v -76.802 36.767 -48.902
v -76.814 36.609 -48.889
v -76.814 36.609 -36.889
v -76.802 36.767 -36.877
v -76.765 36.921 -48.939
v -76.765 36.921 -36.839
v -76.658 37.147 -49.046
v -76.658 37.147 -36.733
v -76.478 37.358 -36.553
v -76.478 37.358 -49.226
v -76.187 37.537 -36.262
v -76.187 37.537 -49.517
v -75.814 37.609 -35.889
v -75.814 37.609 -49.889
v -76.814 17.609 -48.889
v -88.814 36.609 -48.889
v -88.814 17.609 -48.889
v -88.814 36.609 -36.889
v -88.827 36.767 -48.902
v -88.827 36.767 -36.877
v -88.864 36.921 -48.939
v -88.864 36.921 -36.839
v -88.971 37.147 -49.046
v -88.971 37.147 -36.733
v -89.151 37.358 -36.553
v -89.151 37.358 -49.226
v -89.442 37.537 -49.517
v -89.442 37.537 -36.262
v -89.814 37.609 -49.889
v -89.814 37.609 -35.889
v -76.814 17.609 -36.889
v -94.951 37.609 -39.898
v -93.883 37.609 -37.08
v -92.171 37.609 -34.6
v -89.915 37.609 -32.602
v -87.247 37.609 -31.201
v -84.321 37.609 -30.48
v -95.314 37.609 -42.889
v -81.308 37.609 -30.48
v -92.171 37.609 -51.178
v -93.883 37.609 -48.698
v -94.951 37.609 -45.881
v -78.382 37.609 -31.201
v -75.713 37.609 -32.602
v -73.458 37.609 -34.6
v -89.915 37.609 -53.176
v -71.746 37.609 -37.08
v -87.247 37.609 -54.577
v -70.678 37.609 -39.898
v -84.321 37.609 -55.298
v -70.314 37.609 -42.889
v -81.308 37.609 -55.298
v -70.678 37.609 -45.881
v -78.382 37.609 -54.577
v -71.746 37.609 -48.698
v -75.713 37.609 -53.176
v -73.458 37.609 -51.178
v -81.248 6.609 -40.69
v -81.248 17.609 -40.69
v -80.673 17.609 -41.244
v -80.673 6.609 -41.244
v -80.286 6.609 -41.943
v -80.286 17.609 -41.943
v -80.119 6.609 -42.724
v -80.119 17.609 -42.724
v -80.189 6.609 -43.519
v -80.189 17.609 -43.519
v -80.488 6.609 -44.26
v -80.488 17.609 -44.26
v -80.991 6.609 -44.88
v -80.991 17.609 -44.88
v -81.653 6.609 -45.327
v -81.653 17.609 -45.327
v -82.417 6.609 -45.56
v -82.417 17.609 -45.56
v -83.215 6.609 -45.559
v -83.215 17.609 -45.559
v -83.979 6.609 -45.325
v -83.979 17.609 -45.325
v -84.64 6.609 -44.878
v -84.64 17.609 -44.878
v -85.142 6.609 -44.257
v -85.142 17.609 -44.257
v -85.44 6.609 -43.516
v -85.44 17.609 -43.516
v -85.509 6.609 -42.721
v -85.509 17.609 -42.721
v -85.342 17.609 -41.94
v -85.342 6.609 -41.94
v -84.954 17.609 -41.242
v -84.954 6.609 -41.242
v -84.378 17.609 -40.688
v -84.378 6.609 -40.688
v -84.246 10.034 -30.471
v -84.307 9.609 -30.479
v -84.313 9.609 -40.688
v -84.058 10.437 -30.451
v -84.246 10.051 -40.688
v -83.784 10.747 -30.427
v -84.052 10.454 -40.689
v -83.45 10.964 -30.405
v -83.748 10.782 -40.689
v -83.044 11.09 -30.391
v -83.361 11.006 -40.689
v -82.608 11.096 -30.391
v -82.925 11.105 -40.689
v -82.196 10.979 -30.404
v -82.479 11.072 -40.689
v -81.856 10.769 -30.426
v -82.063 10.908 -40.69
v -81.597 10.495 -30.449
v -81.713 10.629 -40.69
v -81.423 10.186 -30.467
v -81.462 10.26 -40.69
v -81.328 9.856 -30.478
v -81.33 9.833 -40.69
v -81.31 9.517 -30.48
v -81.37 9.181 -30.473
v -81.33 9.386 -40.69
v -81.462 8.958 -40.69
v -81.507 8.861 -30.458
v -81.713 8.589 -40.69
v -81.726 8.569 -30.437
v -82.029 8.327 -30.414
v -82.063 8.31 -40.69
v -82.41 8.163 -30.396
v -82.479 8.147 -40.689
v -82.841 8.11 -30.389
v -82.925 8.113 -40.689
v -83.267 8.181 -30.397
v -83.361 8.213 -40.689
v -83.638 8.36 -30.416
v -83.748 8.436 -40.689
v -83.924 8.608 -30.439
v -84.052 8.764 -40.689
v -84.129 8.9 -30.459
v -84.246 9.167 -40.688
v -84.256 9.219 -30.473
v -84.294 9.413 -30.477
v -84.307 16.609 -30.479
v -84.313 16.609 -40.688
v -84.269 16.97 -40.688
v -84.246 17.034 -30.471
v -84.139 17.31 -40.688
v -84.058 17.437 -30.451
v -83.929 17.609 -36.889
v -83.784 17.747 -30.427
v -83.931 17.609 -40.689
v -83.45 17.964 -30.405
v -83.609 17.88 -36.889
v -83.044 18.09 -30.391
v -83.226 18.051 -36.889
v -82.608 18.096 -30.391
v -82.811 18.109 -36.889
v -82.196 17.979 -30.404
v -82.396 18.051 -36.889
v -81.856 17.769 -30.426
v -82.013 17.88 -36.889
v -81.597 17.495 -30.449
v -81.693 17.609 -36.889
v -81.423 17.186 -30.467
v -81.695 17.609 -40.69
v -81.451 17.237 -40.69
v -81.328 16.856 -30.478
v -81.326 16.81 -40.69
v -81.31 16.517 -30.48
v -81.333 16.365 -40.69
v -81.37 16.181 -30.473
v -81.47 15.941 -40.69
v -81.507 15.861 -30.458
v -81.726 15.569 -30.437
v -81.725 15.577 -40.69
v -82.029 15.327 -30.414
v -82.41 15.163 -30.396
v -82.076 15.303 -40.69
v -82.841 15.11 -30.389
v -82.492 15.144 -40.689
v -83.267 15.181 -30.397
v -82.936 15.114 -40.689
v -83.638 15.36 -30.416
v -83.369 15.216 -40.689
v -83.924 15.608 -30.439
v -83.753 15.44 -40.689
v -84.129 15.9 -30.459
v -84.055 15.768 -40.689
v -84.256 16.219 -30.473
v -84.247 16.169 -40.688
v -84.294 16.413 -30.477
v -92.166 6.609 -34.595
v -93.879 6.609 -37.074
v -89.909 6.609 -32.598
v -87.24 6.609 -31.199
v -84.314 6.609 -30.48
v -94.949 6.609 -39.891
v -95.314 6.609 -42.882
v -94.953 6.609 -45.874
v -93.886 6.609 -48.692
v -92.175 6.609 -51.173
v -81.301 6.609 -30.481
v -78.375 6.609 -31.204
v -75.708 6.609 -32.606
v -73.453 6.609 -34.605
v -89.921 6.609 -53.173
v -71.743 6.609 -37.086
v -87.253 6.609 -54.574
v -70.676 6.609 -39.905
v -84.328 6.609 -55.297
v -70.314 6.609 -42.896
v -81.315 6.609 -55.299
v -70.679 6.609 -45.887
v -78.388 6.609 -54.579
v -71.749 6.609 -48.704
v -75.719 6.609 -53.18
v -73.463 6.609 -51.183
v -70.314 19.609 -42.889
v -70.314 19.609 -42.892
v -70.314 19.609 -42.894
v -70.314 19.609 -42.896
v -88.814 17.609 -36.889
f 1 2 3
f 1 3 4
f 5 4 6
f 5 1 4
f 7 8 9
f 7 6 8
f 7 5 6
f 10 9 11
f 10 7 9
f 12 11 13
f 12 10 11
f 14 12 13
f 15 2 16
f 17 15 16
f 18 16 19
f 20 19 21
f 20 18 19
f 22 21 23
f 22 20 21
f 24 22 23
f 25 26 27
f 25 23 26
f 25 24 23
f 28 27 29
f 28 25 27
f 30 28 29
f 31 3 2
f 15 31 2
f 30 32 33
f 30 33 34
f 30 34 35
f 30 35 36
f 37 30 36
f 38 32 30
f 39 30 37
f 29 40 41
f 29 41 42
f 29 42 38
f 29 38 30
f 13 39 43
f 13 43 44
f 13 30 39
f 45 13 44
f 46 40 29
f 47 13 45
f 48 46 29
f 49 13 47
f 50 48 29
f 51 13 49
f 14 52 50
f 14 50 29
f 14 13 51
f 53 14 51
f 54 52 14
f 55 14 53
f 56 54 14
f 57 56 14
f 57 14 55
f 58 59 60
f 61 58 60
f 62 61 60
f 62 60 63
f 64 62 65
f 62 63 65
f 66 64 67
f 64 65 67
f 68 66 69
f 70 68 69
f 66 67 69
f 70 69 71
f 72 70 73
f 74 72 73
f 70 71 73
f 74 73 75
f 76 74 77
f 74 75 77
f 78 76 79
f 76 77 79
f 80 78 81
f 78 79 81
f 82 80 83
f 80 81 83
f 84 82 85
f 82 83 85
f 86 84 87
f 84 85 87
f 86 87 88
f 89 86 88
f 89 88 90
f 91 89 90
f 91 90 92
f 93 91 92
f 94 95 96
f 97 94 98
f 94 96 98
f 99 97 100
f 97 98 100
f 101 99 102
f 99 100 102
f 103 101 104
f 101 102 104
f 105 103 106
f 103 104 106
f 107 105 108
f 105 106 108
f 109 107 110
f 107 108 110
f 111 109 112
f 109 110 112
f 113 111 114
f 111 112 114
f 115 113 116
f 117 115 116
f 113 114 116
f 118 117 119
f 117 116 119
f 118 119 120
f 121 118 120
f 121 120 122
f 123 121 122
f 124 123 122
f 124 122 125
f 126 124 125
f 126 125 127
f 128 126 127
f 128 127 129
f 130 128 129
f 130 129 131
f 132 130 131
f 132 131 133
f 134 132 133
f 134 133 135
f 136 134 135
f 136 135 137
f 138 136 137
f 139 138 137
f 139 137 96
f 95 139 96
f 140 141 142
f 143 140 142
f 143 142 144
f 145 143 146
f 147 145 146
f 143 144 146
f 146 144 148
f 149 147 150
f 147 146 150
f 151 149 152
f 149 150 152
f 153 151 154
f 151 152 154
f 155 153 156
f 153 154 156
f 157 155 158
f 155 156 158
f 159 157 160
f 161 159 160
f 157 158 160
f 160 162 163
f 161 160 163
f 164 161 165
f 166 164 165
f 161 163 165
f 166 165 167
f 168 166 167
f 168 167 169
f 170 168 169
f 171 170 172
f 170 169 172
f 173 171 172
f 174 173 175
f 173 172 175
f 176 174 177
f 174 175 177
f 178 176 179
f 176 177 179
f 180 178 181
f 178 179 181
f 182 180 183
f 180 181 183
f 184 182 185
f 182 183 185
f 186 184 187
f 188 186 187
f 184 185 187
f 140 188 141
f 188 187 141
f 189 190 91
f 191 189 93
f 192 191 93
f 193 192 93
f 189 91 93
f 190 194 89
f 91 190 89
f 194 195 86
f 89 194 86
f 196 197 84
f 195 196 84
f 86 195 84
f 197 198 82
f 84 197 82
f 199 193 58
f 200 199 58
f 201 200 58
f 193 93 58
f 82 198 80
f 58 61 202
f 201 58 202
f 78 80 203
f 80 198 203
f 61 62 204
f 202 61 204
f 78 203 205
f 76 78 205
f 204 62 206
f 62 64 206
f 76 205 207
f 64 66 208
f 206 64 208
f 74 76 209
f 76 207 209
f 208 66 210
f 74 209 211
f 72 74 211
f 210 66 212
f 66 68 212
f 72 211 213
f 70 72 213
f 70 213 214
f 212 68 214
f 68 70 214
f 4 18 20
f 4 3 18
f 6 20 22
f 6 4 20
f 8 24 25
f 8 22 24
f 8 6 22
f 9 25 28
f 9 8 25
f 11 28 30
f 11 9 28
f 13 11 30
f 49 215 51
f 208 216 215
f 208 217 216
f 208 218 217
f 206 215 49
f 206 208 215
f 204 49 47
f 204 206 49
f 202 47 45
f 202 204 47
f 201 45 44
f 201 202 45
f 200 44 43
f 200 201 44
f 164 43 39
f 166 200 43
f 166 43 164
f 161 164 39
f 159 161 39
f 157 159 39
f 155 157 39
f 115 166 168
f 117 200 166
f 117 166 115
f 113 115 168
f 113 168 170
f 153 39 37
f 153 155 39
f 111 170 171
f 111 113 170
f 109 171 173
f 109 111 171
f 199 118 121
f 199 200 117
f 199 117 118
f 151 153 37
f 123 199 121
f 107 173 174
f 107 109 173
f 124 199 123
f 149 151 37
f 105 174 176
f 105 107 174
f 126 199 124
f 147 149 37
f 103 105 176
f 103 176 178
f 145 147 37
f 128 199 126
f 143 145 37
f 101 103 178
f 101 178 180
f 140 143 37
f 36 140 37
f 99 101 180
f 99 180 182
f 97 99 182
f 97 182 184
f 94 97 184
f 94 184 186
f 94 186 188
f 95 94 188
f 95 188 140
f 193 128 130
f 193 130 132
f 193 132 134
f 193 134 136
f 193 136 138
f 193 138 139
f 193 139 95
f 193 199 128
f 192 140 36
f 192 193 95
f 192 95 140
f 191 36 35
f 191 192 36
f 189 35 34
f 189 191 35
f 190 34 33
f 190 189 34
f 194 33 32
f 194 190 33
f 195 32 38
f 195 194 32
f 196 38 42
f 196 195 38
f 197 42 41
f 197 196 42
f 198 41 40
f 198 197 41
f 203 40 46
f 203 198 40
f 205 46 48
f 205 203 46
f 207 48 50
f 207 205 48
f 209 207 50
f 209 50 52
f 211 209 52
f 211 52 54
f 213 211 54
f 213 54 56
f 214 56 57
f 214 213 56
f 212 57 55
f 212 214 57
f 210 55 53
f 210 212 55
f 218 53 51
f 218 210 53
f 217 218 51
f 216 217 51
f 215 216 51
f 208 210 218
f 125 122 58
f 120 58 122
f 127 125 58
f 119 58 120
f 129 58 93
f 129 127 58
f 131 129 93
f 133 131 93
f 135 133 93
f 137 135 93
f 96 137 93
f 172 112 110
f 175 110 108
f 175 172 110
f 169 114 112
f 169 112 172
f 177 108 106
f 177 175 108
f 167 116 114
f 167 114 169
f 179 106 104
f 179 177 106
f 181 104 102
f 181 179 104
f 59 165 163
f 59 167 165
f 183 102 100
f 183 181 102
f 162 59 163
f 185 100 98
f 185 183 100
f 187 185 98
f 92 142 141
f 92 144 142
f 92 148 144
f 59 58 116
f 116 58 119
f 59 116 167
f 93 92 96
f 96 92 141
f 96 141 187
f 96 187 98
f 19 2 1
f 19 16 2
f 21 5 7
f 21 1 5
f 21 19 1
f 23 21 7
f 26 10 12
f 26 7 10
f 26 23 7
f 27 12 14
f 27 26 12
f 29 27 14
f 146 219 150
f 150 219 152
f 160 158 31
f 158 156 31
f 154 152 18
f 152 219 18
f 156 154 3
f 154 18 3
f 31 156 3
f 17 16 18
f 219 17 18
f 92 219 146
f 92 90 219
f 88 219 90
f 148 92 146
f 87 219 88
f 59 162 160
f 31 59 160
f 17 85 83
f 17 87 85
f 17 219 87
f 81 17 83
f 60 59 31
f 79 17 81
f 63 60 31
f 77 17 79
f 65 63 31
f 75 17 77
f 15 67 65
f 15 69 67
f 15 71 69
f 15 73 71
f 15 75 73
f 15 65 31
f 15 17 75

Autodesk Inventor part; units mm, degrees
ref_plane "YZ Plane" through (0, 0, 0) normal (1, 0, 0) x (0, 1, 0)
ref_plane "XZ Plane" through (0, 0, 0) normal (0, 1, 0) x (-1, 0, 0)
ref_plane "XY Plane" through (0, 0, 0) normal (0, 0, 1) x (1, 0, 0)
ref_plane "Work Plane1" through (-82.8143, 19.6092, -42.8892) normal (0, 1, 0) x (0.9999998, 0, -0.0005571)
sketch "Sketch1" plane through (-82.8143, 19.6092, -42.8892) normal (0, 1, 0) x (0.9999998, 0, -0.0005571)
  arc A0 (1.5, -2) -> (-1.5, -2) centre (0, 0) ccw projected
  line L0 (-1.5, -2) -> (-1.1358, -2) projected
  line L1 (-1.1358, -2) -> (1.1358, -2) projected
  line L2 (1.1358, -2) -> (1.5, -2) projected
  line L3 (1.1358, -2.2) -> (-1.1358, -2.2)
  line L4 (-1.1358, -2.2) -> (-1.5652, -2.2)
  arc A1 (1.5652, -2.2) -> (-1.5652, -2.2) centre (0, 0) ccw
  line L5 (1.5652, -2.2) -> (1.1358, -2.2)
  circle A2 centre (0, 0) radius 12.5
  point P0 (82.7904, -42.9353)
  dimension "d0" = 0.2
  dimension "d1" = 25
extrude "Extrusion1" add sketch "Sketch1" against normal blind 13 contours A2
sketch "Sketch2" plane through (-81.2478, 6.6092, -40.69) normal (-0.0005571, 0, -0.9999998) x (-0.9999998, 0, 0.0005571)
  spline S0 degree 2 poles (3.0652, 12.8) (2.8756, 12.9138) (2.701, 13) knots 0 0 0 1 1 1 weights 1.078346 1.041437 1
  line L0 (3.0652, -2) -> (3.0652, 12.8)
  arc A0 (0.0652, -2) -> (3.0652, -2) centre (1.5652, 0.5981) ccw
  line L1 (0.0652, 12.8) -> (0.0652, -2)
  spline S1 degree 2 poles (0.4295, 13) (0.2549, 12.9138) (0.0652, 12.8) knots 0 0 0 1 1 1 weights 1 1.041437 1.078346
  line L2 (2.701, 13) -> (0.4295, 13)
  circle A1 centre (1.5652, 10) radius 1.5
  circle A2 centre (1.5652, 3) radius 1.5
  line L3 (-10.9348, 0) -> (14.0652, 0)
  point P0 (-81.2252, -6.6092)
  dimension "d4" = 3
  dimension "d5" = 3
  dimension "d6" = 3
  dimension "d7" = 3
extrude "Extrusion2" cut sketch "Sketch2" against normal blind 13 contours A1 | A2
sketch "Sketch3" plane through (-82.8143, 19.6092, -42.8892) normal (0, 1, 0) x (1, 0, 0)
  circle A0 centre (0, 0) radius 12.5 projected
  line L0 (1.5665, -2.1991) -> (-1.564, -2.2009) projected
  arc A1 (1.5665, -2.1991) -> (-1.564, -2.2009) centre (0, 0) ccw projected
  point P0 (82.8143, -42.8892)
extrude "Extrusion3" add sketch "Sketch3" along normal blind 3 contours A0 | L0 A1
move faces "Move1" translate (0, 15, 0) faces at (-80.4474, 22.6092, -41.4544)
sketch "Sketch5" plane through (-82.8143, 37.6092, -42.8892) normal (0, 1, 0) x (1, 0, 0)
  line L0 (6, 6) -> (-6, 6)
  line L1 (-6, 6) -> (-6, -6)
  line L2 (-6, -6) -> (6, -6)
  line L3 (6, -6) -> (6, 6)
  line L4 (6, 6) -> (-6, -6) construction
  line L5 (-6, 6) -> (6, -6) construction
  point P0 (82.8143, -42.8892)
  point P1 (0, 0)
  dimension "d18" = 12
  dimension "d19" = 12
extrude "Extrusion5" cut sketch "Sketch5" against normal blind 20
fillet "Fillet2" radius 1 4 edges at (-82.8143, 37.6092, -36.8892) (-76.8143, 37.6092, -42.8892) (-82.8143, 37.6092, -48.8892) (-88.8143, 37.6092, -42.8892)
sketch "Sketch6" plane through (-82.8143, 17.6092, -42.8892) normal (0, 1, 0) x (1, 0, 0)
  line L0 (-1.1168, -2.2006) -> (-1.1147, -6) projected
  line L1 (-1.564, -2.2009) -> (-1.1168, -2.2006) projected
  arc A0 (1.5665, -2.1991) -> (-1.564, -2.2009) centre (0, 0) ccw projected
  line L2 (1.1193, -2.1994) -> (1.5665, -2.1991) projected
  line L3 (1.1214, -6) -> (1.1193, -2.1994) projected
  line L4 (6, -6) -> (1.1214, -6) projected
  line L5 (6, 6) -> (6, -6) projected
  line L6 (-6, 6) -> (6, 6) projected
  line L7 (-6, -6) -> (-6, 6) projected
  line L8 (-1.1147, -6) -> (-6, -6) projected
  line L9 (6, -6) -> (-6, -6) projected
ref_plane "Work Plane2" through (4.3942, -24.185, 88.7409) normal (0, 1, 0) x (0.9994696, 0, 0.0325661)
sketch "Sketch7" plane through (4.3942, -24.185, 88.7409) normal (0, 1, 0) x (0.9994696, 0, 0.0325661)
  point P0 (-7.2818, 88.5508)
equation "\"d7\" = d6"
properties part number "Motor-Driver Coupler"
